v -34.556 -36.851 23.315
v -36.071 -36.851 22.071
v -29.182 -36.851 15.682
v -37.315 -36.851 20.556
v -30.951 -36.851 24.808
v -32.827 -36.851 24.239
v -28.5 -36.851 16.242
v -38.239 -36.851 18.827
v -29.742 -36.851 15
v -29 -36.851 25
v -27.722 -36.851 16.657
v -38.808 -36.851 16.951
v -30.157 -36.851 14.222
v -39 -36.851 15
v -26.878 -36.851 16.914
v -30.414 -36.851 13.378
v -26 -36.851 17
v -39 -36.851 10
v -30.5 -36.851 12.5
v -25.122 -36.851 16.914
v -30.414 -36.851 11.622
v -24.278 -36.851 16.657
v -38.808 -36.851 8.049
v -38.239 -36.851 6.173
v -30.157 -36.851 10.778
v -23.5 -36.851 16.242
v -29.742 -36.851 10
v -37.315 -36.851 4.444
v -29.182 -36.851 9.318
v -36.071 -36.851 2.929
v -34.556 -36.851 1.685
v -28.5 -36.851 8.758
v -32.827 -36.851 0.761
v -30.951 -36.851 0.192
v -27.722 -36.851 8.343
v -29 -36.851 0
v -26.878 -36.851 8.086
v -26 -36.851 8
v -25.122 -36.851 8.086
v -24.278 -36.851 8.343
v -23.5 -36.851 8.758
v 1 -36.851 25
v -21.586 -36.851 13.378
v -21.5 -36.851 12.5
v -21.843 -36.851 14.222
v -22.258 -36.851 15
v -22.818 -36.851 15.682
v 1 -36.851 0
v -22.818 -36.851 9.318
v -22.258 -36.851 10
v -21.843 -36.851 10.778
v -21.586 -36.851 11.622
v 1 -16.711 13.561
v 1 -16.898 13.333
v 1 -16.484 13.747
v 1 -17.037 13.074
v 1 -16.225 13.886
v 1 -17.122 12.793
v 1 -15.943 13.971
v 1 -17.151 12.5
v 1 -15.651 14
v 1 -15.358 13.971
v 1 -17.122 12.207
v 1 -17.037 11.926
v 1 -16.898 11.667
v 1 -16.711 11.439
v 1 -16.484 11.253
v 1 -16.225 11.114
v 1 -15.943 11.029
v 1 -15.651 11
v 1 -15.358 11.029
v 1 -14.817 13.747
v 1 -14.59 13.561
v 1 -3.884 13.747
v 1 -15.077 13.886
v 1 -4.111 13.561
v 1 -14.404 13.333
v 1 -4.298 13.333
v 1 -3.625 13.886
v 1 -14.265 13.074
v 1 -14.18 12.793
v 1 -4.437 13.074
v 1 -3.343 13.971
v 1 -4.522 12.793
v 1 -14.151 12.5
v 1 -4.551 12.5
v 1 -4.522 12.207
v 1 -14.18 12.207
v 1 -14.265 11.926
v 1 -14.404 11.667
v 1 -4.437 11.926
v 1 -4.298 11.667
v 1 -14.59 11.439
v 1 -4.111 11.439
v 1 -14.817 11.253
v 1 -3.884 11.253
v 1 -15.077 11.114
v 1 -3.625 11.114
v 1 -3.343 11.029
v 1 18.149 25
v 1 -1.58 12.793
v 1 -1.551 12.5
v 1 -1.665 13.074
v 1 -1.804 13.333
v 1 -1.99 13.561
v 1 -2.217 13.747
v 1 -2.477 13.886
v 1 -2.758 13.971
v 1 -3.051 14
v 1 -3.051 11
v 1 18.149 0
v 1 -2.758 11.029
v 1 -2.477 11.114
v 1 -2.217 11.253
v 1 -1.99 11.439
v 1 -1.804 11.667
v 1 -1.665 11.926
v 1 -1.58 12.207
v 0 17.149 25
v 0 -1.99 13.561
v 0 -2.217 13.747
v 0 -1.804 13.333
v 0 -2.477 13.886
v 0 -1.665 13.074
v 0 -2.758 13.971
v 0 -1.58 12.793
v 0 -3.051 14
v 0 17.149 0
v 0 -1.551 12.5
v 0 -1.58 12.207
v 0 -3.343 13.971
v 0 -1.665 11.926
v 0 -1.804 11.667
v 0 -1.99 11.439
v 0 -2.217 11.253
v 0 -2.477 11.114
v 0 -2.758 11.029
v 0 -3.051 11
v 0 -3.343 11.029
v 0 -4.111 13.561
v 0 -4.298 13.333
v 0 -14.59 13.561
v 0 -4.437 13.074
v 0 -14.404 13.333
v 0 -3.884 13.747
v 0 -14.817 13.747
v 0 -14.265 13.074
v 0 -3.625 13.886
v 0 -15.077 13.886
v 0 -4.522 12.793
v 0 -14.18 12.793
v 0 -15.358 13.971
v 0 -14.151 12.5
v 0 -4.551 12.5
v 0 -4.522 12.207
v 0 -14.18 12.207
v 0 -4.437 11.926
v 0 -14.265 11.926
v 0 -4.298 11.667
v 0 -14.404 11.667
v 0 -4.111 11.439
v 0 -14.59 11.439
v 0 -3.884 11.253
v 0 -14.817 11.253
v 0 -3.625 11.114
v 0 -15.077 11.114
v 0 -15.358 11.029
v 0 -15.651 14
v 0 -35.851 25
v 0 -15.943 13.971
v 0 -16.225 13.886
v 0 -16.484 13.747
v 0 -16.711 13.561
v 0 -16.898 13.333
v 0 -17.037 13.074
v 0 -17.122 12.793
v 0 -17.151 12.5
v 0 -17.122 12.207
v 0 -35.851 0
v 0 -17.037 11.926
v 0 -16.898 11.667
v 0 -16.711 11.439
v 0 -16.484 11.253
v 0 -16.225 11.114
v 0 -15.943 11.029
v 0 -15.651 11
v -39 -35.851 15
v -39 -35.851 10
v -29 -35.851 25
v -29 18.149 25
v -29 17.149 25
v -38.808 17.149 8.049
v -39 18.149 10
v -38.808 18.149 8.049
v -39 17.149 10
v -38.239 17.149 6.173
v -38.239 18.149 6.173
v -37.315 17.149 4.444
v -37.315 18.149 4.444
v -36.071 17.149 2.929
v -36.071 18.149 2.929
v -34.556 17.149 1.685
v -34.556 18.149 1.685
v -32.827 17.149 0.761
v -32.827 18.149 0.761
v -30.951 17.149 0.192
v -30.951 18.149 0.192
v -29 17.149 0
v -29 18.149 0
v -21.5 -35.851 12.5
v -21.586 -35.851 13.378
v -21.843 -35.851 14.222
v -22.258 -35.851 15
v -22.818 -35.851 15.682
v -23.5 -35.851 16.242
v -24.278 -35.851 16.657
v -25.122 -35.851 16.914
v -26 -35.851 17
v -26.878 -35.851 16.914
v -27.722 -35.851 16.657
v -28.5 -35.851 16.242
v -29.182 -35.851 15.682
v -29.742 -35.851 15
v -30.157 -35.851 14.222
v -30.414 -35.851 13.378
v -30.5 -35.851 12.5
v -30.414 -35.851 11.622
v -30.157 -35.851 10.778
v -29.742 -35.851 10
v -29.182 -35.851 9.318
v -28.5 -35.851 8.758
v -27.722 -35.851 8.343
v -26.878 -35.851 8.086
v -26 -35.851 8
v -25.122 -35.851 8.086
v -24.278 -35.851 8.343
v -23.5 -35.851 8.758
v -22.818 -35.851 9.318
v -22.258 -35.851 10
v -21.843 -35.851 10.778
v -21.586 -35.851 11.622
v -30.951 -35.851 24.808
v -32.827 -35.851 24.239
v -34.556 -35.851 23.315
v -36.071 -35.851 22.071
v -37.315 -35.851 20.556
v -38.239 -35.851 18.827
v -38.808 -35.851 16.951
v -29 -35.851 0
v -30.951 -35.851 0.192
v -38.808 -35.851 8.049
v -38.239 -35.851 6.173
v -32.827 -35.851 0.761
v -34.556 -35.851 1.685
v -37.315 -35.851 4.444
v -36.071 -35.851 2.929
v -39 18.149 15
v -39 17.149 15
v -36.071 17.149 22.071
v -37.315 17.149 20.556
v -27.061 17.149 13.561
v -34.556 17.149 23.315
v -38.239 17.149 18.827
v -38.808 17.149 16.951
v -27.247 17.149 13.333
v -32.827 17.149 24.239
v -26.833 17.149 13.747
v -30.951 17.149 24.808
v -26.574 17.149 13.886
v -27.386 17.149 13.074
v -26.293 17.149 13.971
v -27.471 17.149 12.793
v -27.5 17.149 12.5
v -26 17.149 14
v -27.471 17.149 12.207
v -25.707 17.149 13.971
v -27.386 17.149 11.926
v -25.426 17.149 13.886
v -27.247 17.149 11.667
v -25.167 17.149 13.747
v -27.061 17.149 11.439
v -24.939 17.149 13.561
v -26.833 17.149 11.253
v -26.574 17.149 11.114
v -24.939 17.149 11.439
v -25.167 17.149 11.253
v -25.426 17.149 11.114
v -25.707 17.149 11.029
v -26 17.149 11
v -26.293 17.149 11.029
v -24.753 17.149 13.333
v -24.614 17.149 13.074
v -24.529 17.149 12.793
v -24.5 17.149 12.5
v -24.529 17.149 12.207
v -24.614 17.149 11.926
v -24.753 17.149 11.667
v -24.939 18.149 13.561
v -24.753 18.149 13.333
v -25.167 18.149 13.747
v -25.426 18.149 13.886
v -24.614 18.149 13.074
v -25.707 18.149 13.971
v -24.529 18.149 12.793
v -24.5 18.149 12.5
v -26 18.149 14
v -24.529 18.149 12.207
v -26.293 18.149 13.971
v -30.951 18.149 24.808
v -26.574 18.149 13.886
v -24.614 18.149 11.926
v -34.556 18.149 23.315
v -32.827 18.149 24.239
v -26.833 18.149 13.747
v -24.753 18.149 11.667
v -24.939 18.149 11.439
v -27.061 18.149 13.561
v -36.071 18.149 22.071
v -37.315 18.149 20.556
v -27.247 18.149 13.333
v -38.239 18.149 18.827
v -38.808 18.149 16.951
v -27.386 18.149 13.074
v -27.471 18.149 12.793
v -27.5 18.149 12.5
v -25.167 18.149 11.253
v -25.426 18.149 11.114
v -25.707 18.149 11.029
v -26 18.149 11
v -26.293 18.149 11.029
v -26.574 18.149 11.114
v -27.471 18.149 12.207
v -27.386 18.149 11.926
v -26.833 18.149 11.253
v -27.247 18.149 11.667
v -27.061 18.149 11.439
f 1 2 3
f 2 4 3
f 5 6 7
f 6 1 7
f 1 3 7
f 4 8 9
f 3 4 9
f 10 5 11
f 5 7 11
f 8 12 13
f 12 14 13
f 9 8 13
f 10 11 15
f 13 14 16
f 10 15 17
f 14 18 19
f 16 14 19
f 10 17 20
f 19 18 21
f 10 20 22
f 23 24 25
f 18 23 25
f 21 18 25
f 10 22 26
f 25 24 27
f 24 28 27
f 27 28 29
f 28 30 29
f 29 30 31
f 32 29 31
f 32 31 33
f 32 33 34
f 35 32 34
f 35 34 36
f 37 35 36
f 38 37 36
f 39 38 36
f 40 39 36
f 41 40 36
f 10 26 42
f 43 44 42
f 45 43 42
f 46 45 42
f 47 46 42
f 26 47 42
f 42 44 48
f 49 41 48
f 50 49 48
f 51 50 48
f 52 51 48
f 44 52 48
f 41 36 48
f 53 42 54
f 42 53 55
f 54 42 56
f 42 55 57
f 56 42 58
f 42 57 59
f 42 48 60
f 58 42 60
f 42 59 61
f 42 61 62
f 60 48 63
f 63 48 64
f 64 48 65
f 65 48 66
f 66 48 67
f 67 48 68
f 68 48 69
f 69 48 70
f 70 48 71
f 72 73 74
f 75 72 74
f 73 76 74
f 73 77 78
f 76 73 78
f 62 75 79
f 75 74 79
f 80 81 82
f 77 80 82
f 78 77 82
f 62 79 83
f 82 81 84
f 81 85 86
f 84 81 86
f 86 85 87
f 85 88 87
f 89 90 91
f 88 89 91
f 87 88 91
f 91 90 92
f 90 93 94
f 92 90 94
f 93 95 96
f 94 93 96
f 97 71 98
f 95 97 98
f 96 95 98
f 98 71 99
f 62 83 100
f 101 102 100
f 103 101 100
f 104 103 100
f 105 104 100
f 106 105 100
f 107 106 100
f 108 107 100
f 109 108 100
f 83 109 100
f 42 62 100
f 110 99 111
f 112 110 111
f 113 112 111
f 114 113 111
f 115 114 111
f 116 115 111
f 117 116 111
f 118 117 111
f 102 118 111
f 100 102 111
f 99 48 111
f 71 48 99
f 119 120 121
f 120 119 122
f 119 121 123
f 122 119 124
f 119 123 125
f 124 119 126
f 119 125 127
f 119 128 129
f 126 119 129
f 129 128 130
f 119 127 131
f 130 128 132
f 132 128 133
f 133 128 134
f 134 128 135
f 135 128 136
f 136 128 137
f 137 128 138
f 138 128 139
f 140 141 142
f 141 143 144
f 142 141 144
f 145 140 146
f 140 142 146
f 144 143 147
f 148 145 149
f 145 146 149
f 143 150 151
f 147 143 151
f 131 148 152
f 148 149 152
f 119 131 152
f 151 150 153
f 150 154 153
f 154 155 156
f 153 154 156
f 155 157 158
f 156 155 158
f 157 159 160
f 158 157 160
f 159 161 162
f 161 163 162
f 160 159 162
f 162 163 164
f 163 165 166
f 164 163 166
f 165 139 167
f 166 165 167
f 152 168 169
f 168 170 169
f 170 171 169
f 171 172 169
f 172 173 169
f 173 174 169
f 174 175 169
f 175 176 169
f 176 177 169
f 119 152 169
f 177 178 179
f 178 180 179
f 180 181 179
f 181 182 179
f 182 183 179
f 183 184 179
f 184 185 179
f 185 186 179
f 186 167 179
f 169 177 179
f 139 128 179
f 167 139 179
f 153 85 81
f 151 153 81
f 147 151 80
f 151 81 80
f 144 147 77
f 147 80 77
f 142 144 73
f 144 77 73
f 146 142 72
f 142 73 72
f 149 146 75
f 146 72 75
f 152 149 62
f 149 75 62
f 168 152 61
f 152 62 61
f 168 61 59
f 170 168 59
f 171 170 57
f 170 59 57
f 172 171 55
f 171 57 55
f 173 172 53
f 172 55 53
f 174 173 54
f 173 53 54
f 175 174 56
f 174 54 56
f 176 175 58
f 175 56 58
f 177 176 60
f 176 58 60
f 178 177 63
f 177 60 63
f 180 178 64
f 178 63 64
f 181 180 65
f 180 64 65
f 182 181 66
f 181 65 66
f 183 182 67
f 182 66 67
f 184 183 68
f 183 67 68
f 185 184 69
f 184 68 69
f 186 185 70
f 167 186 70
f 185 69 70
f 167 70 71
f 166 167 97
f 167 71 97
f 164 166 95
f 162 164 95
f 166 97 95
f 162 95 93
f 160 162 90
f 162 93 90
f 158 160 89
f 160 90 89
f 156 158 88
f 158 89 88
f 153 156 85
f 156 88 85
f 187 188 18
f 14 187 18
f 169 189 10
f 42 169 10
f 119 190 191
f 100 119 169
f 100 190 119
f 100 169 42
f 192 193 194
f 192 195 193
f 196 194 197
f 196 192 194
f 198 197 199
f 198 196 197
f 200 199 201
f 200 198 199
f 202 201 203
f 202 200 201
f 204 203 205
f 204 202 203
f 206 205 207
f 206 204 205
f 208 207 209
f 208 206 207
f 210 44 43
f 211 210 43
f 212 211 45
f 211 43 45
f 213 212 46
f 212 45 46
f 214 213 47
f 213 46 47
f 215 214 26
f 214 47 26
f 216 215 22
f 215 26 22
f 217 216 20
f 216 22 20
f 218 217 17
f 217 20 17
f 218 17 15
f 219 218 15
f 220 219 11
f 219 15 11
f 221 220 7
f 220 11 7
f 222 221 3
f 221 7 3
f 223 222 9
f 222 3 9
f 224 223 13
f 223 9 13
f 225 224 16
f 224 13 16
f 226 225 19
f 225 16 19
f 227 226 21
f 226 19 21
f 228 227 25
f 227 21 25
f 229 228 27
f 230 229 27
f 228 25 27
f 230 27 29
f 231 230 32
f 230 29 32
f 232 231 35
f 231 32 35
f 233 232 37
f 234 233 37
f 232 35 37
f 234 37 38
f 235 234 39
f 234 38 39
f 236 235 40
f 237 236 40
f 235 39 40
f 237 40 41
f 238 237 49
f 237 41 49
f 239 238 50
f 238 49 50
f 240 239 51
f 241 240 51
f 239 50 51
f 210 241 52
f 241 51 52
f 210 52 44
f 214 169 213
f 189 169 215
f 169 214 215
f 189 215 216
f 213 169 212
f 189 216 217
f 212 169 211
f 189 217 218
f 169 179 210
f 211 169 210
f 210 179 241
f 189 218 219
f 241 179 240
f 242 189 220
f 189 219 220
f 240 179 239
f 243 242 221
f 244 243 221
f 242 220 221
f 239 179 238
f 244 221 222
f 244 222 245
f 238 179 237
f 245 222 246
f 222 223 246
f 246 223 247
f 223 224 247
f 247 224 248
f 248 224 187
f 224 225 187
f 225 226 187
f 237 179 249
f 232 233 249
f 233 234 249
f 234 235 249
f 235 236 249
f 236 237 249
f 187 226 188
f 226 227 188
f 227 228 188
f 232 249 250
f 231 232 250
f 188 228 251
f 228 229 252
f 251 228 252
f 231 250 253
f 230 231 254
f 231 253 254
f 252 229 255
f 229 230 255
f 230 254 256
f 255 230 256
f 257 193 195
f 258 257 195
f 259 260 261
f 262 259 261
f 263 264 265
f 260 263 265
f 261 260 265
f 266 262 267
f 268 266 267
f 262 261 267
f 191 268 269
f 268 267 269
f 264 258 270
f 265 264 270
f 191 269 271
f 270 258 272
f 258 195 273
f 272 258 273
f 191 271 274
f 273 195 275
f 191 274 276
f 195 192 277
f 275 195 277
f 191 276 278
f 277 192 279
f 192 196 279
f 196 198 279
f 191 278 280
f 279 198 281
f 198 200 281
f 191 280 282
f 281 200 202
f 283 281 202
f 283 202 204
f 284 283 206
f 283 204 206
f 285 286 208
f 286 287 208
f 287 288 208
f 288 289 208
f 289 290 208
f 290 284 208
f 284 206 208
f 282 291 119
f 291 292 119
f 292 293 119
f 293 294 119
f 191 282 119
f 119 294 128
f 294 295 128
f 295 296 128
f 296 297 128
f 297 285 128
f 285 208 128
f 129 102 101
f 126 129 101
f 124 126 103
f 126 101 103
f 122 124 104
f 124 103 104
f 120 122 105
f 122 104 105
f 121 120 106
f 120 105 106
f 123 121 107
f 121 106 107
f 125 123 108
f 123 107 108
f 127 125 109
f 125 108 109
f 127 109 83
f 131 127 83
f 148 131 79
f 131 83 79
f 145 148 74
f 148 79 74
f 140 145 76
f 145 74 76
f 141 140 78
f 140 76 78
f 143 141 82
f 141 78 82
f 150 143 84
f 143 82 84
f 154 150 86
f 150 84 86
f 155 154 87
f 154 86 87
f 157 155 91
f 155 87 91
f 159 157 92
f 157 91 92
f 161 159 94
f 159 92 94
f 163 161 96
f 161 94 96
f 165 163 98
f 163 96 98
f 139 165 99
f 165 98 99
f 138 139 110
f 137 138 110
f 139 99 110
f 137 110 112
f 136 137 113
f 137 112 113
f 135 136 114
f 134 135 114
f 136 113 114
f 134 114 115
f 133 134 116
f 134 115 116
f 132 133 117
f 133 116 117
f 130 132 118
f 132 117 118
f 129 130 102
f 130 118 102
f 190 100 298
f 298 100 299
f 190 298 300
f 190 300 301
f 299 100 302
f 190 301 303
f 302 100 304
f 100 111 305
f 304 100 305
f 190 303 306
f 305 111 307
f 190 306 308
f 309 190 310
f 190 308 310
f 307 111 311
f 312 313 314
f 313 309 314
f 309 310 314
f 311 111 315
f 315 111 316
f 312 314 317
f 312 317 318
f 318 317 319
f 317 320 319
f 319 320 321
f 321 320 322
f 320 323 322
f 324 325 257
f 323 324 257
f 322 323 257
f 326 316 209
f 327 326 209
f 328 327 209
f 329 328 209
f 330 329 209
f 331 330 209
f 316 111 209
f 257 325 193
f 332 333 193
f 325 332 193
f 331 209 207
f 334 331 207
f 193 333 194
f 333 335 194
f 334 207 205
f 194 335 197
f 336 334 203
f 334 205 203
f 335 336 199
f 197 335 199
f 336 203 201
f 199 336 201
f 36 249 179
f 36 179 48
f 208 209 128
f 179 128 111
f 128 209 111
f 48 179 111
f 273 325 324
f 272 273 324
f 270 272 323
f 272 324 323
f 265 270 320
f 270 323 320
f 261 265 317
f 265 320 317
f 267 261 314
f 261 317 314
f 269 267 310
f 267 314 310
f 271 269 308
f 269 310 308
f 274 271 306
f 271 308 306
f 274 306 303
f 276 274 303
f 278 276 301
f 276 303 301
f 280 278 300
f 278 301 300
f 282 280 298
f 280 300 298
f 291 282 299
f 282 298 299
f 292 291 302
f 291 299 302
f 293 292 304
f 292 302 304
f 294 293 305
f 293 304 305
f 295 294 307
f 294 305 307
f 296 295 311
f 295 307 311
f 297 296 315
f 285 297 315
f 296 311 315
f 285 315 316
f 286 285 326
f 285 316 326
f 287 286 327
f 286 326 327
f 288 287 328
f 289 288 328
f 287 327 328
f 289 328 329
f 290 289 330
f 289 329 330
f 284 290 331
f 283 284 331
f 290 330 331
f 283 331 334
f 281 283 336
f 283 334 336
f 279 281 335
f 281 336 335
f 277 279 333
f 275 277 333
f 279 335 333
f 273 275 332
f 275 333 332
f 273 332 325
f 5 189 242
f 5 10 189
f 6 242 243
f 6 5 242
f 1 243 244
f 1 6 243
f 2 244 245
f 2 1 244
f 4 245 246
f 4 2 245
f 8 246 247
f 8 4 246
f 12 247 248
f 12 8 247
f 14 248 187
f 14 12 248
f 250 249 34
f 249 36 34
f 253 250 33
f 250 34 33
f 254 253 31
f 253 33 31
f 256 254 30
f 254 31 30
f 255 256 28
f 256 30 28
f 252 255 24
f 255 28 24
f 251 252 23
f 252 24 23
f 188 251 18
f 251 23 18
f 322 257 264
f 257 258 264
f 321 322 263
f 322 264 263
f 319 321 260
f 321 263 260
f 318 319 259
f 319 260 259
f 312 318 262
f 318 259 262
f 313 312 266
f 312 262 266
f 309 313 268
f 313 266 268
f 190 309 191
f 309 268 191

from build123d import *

# Parameters (mm, degrees)
EXTRUIR_L_MINA1_DEPTH = 25
CROQUIS2_R            = 1.5
CORTAR_EXTRUIR1_DEPTH = 1
CROQUIS5_R            = 4.5
CORTAR_EXTRUIR2_DEPTH = 1
CROQUIS6_R            = 1.5
CORTAR_EXTRUIR3_DEPTH = 1
REDONDEO1_R           = 10


with BuildPart() as part:
    # Croquis1 → Extruir-Lámina1 (new body)
    with BuildSketch(Plane.XY):
        Polygon((-39, 17.149283258), (0, 17.149283258), (0, -35.850716742), (-39, -35.850716742), (-39, -36.850716742), (1, -36.850716742), (1, 18.149283258), (-39, 18.149283258), align=None)
    extrude(amount=EXTRUIR_L_MINA1_DEPTH)

    # Croquis2 → Cortar-Extruir1 (cut)
    with BuildSketch(Plane(origin=(0, 18.149283258, 0), x_dir=(1, 0, 0), z_dir=(0, 1, 0))):
        with Locations(Location((-26, -12.5, 0), (0, 0, 180))):
            Circle(CROQUIS2_R)
    extrude(amount=-CORTAR_EXTRUIR1_DEPTH, mode=Mode.SUBTRACT)

    # Croquis5 → Cortar-Extruir2 (cut)
    with BuildSketch(Plane.XZ.offset(36.850716742)):
        with Locations((-26, 12.5)):
            Circle(CROQUIS5_R)
    extrude(amount=-CORTAR_EXTRUIR2_DEPTH, mode=Mode.SUBTRACT)

    # Croquis6 → Cortar-Extruir3 (cut)
    with BuildSketch(Plane(origin=(1, 0, 0), x_dir=(0, 0, -1), z_dir=(1, 0, 0))):
        with Locations(Location((-12.5, -15.650716742, 0), (0, 0, 90))):
            Circle(CROQUIS6_R)
        with Locations(Location((-12.5, -3.050716742, 0), (0, 0, 90))):
            Circle(CROQUIS6_R)
    extrude(amount=-CORTAR_EXTRUIR3_DEPTH, mode=Mode.SUBTRACT)

    # Redondeo1
    redondeo1_edges = [part.edges().sort_by_distance(p)[0] for p in [
        (-39, -36.350716742, 25),
        (-39, 17.649283258, 25),
        (-39, -36.350716742, 0),
        (-39, 17.649283258, 0),
    ]]
    fillet(redondeo1_edges, radius=REDONDEO1_R)


solid = part.part
